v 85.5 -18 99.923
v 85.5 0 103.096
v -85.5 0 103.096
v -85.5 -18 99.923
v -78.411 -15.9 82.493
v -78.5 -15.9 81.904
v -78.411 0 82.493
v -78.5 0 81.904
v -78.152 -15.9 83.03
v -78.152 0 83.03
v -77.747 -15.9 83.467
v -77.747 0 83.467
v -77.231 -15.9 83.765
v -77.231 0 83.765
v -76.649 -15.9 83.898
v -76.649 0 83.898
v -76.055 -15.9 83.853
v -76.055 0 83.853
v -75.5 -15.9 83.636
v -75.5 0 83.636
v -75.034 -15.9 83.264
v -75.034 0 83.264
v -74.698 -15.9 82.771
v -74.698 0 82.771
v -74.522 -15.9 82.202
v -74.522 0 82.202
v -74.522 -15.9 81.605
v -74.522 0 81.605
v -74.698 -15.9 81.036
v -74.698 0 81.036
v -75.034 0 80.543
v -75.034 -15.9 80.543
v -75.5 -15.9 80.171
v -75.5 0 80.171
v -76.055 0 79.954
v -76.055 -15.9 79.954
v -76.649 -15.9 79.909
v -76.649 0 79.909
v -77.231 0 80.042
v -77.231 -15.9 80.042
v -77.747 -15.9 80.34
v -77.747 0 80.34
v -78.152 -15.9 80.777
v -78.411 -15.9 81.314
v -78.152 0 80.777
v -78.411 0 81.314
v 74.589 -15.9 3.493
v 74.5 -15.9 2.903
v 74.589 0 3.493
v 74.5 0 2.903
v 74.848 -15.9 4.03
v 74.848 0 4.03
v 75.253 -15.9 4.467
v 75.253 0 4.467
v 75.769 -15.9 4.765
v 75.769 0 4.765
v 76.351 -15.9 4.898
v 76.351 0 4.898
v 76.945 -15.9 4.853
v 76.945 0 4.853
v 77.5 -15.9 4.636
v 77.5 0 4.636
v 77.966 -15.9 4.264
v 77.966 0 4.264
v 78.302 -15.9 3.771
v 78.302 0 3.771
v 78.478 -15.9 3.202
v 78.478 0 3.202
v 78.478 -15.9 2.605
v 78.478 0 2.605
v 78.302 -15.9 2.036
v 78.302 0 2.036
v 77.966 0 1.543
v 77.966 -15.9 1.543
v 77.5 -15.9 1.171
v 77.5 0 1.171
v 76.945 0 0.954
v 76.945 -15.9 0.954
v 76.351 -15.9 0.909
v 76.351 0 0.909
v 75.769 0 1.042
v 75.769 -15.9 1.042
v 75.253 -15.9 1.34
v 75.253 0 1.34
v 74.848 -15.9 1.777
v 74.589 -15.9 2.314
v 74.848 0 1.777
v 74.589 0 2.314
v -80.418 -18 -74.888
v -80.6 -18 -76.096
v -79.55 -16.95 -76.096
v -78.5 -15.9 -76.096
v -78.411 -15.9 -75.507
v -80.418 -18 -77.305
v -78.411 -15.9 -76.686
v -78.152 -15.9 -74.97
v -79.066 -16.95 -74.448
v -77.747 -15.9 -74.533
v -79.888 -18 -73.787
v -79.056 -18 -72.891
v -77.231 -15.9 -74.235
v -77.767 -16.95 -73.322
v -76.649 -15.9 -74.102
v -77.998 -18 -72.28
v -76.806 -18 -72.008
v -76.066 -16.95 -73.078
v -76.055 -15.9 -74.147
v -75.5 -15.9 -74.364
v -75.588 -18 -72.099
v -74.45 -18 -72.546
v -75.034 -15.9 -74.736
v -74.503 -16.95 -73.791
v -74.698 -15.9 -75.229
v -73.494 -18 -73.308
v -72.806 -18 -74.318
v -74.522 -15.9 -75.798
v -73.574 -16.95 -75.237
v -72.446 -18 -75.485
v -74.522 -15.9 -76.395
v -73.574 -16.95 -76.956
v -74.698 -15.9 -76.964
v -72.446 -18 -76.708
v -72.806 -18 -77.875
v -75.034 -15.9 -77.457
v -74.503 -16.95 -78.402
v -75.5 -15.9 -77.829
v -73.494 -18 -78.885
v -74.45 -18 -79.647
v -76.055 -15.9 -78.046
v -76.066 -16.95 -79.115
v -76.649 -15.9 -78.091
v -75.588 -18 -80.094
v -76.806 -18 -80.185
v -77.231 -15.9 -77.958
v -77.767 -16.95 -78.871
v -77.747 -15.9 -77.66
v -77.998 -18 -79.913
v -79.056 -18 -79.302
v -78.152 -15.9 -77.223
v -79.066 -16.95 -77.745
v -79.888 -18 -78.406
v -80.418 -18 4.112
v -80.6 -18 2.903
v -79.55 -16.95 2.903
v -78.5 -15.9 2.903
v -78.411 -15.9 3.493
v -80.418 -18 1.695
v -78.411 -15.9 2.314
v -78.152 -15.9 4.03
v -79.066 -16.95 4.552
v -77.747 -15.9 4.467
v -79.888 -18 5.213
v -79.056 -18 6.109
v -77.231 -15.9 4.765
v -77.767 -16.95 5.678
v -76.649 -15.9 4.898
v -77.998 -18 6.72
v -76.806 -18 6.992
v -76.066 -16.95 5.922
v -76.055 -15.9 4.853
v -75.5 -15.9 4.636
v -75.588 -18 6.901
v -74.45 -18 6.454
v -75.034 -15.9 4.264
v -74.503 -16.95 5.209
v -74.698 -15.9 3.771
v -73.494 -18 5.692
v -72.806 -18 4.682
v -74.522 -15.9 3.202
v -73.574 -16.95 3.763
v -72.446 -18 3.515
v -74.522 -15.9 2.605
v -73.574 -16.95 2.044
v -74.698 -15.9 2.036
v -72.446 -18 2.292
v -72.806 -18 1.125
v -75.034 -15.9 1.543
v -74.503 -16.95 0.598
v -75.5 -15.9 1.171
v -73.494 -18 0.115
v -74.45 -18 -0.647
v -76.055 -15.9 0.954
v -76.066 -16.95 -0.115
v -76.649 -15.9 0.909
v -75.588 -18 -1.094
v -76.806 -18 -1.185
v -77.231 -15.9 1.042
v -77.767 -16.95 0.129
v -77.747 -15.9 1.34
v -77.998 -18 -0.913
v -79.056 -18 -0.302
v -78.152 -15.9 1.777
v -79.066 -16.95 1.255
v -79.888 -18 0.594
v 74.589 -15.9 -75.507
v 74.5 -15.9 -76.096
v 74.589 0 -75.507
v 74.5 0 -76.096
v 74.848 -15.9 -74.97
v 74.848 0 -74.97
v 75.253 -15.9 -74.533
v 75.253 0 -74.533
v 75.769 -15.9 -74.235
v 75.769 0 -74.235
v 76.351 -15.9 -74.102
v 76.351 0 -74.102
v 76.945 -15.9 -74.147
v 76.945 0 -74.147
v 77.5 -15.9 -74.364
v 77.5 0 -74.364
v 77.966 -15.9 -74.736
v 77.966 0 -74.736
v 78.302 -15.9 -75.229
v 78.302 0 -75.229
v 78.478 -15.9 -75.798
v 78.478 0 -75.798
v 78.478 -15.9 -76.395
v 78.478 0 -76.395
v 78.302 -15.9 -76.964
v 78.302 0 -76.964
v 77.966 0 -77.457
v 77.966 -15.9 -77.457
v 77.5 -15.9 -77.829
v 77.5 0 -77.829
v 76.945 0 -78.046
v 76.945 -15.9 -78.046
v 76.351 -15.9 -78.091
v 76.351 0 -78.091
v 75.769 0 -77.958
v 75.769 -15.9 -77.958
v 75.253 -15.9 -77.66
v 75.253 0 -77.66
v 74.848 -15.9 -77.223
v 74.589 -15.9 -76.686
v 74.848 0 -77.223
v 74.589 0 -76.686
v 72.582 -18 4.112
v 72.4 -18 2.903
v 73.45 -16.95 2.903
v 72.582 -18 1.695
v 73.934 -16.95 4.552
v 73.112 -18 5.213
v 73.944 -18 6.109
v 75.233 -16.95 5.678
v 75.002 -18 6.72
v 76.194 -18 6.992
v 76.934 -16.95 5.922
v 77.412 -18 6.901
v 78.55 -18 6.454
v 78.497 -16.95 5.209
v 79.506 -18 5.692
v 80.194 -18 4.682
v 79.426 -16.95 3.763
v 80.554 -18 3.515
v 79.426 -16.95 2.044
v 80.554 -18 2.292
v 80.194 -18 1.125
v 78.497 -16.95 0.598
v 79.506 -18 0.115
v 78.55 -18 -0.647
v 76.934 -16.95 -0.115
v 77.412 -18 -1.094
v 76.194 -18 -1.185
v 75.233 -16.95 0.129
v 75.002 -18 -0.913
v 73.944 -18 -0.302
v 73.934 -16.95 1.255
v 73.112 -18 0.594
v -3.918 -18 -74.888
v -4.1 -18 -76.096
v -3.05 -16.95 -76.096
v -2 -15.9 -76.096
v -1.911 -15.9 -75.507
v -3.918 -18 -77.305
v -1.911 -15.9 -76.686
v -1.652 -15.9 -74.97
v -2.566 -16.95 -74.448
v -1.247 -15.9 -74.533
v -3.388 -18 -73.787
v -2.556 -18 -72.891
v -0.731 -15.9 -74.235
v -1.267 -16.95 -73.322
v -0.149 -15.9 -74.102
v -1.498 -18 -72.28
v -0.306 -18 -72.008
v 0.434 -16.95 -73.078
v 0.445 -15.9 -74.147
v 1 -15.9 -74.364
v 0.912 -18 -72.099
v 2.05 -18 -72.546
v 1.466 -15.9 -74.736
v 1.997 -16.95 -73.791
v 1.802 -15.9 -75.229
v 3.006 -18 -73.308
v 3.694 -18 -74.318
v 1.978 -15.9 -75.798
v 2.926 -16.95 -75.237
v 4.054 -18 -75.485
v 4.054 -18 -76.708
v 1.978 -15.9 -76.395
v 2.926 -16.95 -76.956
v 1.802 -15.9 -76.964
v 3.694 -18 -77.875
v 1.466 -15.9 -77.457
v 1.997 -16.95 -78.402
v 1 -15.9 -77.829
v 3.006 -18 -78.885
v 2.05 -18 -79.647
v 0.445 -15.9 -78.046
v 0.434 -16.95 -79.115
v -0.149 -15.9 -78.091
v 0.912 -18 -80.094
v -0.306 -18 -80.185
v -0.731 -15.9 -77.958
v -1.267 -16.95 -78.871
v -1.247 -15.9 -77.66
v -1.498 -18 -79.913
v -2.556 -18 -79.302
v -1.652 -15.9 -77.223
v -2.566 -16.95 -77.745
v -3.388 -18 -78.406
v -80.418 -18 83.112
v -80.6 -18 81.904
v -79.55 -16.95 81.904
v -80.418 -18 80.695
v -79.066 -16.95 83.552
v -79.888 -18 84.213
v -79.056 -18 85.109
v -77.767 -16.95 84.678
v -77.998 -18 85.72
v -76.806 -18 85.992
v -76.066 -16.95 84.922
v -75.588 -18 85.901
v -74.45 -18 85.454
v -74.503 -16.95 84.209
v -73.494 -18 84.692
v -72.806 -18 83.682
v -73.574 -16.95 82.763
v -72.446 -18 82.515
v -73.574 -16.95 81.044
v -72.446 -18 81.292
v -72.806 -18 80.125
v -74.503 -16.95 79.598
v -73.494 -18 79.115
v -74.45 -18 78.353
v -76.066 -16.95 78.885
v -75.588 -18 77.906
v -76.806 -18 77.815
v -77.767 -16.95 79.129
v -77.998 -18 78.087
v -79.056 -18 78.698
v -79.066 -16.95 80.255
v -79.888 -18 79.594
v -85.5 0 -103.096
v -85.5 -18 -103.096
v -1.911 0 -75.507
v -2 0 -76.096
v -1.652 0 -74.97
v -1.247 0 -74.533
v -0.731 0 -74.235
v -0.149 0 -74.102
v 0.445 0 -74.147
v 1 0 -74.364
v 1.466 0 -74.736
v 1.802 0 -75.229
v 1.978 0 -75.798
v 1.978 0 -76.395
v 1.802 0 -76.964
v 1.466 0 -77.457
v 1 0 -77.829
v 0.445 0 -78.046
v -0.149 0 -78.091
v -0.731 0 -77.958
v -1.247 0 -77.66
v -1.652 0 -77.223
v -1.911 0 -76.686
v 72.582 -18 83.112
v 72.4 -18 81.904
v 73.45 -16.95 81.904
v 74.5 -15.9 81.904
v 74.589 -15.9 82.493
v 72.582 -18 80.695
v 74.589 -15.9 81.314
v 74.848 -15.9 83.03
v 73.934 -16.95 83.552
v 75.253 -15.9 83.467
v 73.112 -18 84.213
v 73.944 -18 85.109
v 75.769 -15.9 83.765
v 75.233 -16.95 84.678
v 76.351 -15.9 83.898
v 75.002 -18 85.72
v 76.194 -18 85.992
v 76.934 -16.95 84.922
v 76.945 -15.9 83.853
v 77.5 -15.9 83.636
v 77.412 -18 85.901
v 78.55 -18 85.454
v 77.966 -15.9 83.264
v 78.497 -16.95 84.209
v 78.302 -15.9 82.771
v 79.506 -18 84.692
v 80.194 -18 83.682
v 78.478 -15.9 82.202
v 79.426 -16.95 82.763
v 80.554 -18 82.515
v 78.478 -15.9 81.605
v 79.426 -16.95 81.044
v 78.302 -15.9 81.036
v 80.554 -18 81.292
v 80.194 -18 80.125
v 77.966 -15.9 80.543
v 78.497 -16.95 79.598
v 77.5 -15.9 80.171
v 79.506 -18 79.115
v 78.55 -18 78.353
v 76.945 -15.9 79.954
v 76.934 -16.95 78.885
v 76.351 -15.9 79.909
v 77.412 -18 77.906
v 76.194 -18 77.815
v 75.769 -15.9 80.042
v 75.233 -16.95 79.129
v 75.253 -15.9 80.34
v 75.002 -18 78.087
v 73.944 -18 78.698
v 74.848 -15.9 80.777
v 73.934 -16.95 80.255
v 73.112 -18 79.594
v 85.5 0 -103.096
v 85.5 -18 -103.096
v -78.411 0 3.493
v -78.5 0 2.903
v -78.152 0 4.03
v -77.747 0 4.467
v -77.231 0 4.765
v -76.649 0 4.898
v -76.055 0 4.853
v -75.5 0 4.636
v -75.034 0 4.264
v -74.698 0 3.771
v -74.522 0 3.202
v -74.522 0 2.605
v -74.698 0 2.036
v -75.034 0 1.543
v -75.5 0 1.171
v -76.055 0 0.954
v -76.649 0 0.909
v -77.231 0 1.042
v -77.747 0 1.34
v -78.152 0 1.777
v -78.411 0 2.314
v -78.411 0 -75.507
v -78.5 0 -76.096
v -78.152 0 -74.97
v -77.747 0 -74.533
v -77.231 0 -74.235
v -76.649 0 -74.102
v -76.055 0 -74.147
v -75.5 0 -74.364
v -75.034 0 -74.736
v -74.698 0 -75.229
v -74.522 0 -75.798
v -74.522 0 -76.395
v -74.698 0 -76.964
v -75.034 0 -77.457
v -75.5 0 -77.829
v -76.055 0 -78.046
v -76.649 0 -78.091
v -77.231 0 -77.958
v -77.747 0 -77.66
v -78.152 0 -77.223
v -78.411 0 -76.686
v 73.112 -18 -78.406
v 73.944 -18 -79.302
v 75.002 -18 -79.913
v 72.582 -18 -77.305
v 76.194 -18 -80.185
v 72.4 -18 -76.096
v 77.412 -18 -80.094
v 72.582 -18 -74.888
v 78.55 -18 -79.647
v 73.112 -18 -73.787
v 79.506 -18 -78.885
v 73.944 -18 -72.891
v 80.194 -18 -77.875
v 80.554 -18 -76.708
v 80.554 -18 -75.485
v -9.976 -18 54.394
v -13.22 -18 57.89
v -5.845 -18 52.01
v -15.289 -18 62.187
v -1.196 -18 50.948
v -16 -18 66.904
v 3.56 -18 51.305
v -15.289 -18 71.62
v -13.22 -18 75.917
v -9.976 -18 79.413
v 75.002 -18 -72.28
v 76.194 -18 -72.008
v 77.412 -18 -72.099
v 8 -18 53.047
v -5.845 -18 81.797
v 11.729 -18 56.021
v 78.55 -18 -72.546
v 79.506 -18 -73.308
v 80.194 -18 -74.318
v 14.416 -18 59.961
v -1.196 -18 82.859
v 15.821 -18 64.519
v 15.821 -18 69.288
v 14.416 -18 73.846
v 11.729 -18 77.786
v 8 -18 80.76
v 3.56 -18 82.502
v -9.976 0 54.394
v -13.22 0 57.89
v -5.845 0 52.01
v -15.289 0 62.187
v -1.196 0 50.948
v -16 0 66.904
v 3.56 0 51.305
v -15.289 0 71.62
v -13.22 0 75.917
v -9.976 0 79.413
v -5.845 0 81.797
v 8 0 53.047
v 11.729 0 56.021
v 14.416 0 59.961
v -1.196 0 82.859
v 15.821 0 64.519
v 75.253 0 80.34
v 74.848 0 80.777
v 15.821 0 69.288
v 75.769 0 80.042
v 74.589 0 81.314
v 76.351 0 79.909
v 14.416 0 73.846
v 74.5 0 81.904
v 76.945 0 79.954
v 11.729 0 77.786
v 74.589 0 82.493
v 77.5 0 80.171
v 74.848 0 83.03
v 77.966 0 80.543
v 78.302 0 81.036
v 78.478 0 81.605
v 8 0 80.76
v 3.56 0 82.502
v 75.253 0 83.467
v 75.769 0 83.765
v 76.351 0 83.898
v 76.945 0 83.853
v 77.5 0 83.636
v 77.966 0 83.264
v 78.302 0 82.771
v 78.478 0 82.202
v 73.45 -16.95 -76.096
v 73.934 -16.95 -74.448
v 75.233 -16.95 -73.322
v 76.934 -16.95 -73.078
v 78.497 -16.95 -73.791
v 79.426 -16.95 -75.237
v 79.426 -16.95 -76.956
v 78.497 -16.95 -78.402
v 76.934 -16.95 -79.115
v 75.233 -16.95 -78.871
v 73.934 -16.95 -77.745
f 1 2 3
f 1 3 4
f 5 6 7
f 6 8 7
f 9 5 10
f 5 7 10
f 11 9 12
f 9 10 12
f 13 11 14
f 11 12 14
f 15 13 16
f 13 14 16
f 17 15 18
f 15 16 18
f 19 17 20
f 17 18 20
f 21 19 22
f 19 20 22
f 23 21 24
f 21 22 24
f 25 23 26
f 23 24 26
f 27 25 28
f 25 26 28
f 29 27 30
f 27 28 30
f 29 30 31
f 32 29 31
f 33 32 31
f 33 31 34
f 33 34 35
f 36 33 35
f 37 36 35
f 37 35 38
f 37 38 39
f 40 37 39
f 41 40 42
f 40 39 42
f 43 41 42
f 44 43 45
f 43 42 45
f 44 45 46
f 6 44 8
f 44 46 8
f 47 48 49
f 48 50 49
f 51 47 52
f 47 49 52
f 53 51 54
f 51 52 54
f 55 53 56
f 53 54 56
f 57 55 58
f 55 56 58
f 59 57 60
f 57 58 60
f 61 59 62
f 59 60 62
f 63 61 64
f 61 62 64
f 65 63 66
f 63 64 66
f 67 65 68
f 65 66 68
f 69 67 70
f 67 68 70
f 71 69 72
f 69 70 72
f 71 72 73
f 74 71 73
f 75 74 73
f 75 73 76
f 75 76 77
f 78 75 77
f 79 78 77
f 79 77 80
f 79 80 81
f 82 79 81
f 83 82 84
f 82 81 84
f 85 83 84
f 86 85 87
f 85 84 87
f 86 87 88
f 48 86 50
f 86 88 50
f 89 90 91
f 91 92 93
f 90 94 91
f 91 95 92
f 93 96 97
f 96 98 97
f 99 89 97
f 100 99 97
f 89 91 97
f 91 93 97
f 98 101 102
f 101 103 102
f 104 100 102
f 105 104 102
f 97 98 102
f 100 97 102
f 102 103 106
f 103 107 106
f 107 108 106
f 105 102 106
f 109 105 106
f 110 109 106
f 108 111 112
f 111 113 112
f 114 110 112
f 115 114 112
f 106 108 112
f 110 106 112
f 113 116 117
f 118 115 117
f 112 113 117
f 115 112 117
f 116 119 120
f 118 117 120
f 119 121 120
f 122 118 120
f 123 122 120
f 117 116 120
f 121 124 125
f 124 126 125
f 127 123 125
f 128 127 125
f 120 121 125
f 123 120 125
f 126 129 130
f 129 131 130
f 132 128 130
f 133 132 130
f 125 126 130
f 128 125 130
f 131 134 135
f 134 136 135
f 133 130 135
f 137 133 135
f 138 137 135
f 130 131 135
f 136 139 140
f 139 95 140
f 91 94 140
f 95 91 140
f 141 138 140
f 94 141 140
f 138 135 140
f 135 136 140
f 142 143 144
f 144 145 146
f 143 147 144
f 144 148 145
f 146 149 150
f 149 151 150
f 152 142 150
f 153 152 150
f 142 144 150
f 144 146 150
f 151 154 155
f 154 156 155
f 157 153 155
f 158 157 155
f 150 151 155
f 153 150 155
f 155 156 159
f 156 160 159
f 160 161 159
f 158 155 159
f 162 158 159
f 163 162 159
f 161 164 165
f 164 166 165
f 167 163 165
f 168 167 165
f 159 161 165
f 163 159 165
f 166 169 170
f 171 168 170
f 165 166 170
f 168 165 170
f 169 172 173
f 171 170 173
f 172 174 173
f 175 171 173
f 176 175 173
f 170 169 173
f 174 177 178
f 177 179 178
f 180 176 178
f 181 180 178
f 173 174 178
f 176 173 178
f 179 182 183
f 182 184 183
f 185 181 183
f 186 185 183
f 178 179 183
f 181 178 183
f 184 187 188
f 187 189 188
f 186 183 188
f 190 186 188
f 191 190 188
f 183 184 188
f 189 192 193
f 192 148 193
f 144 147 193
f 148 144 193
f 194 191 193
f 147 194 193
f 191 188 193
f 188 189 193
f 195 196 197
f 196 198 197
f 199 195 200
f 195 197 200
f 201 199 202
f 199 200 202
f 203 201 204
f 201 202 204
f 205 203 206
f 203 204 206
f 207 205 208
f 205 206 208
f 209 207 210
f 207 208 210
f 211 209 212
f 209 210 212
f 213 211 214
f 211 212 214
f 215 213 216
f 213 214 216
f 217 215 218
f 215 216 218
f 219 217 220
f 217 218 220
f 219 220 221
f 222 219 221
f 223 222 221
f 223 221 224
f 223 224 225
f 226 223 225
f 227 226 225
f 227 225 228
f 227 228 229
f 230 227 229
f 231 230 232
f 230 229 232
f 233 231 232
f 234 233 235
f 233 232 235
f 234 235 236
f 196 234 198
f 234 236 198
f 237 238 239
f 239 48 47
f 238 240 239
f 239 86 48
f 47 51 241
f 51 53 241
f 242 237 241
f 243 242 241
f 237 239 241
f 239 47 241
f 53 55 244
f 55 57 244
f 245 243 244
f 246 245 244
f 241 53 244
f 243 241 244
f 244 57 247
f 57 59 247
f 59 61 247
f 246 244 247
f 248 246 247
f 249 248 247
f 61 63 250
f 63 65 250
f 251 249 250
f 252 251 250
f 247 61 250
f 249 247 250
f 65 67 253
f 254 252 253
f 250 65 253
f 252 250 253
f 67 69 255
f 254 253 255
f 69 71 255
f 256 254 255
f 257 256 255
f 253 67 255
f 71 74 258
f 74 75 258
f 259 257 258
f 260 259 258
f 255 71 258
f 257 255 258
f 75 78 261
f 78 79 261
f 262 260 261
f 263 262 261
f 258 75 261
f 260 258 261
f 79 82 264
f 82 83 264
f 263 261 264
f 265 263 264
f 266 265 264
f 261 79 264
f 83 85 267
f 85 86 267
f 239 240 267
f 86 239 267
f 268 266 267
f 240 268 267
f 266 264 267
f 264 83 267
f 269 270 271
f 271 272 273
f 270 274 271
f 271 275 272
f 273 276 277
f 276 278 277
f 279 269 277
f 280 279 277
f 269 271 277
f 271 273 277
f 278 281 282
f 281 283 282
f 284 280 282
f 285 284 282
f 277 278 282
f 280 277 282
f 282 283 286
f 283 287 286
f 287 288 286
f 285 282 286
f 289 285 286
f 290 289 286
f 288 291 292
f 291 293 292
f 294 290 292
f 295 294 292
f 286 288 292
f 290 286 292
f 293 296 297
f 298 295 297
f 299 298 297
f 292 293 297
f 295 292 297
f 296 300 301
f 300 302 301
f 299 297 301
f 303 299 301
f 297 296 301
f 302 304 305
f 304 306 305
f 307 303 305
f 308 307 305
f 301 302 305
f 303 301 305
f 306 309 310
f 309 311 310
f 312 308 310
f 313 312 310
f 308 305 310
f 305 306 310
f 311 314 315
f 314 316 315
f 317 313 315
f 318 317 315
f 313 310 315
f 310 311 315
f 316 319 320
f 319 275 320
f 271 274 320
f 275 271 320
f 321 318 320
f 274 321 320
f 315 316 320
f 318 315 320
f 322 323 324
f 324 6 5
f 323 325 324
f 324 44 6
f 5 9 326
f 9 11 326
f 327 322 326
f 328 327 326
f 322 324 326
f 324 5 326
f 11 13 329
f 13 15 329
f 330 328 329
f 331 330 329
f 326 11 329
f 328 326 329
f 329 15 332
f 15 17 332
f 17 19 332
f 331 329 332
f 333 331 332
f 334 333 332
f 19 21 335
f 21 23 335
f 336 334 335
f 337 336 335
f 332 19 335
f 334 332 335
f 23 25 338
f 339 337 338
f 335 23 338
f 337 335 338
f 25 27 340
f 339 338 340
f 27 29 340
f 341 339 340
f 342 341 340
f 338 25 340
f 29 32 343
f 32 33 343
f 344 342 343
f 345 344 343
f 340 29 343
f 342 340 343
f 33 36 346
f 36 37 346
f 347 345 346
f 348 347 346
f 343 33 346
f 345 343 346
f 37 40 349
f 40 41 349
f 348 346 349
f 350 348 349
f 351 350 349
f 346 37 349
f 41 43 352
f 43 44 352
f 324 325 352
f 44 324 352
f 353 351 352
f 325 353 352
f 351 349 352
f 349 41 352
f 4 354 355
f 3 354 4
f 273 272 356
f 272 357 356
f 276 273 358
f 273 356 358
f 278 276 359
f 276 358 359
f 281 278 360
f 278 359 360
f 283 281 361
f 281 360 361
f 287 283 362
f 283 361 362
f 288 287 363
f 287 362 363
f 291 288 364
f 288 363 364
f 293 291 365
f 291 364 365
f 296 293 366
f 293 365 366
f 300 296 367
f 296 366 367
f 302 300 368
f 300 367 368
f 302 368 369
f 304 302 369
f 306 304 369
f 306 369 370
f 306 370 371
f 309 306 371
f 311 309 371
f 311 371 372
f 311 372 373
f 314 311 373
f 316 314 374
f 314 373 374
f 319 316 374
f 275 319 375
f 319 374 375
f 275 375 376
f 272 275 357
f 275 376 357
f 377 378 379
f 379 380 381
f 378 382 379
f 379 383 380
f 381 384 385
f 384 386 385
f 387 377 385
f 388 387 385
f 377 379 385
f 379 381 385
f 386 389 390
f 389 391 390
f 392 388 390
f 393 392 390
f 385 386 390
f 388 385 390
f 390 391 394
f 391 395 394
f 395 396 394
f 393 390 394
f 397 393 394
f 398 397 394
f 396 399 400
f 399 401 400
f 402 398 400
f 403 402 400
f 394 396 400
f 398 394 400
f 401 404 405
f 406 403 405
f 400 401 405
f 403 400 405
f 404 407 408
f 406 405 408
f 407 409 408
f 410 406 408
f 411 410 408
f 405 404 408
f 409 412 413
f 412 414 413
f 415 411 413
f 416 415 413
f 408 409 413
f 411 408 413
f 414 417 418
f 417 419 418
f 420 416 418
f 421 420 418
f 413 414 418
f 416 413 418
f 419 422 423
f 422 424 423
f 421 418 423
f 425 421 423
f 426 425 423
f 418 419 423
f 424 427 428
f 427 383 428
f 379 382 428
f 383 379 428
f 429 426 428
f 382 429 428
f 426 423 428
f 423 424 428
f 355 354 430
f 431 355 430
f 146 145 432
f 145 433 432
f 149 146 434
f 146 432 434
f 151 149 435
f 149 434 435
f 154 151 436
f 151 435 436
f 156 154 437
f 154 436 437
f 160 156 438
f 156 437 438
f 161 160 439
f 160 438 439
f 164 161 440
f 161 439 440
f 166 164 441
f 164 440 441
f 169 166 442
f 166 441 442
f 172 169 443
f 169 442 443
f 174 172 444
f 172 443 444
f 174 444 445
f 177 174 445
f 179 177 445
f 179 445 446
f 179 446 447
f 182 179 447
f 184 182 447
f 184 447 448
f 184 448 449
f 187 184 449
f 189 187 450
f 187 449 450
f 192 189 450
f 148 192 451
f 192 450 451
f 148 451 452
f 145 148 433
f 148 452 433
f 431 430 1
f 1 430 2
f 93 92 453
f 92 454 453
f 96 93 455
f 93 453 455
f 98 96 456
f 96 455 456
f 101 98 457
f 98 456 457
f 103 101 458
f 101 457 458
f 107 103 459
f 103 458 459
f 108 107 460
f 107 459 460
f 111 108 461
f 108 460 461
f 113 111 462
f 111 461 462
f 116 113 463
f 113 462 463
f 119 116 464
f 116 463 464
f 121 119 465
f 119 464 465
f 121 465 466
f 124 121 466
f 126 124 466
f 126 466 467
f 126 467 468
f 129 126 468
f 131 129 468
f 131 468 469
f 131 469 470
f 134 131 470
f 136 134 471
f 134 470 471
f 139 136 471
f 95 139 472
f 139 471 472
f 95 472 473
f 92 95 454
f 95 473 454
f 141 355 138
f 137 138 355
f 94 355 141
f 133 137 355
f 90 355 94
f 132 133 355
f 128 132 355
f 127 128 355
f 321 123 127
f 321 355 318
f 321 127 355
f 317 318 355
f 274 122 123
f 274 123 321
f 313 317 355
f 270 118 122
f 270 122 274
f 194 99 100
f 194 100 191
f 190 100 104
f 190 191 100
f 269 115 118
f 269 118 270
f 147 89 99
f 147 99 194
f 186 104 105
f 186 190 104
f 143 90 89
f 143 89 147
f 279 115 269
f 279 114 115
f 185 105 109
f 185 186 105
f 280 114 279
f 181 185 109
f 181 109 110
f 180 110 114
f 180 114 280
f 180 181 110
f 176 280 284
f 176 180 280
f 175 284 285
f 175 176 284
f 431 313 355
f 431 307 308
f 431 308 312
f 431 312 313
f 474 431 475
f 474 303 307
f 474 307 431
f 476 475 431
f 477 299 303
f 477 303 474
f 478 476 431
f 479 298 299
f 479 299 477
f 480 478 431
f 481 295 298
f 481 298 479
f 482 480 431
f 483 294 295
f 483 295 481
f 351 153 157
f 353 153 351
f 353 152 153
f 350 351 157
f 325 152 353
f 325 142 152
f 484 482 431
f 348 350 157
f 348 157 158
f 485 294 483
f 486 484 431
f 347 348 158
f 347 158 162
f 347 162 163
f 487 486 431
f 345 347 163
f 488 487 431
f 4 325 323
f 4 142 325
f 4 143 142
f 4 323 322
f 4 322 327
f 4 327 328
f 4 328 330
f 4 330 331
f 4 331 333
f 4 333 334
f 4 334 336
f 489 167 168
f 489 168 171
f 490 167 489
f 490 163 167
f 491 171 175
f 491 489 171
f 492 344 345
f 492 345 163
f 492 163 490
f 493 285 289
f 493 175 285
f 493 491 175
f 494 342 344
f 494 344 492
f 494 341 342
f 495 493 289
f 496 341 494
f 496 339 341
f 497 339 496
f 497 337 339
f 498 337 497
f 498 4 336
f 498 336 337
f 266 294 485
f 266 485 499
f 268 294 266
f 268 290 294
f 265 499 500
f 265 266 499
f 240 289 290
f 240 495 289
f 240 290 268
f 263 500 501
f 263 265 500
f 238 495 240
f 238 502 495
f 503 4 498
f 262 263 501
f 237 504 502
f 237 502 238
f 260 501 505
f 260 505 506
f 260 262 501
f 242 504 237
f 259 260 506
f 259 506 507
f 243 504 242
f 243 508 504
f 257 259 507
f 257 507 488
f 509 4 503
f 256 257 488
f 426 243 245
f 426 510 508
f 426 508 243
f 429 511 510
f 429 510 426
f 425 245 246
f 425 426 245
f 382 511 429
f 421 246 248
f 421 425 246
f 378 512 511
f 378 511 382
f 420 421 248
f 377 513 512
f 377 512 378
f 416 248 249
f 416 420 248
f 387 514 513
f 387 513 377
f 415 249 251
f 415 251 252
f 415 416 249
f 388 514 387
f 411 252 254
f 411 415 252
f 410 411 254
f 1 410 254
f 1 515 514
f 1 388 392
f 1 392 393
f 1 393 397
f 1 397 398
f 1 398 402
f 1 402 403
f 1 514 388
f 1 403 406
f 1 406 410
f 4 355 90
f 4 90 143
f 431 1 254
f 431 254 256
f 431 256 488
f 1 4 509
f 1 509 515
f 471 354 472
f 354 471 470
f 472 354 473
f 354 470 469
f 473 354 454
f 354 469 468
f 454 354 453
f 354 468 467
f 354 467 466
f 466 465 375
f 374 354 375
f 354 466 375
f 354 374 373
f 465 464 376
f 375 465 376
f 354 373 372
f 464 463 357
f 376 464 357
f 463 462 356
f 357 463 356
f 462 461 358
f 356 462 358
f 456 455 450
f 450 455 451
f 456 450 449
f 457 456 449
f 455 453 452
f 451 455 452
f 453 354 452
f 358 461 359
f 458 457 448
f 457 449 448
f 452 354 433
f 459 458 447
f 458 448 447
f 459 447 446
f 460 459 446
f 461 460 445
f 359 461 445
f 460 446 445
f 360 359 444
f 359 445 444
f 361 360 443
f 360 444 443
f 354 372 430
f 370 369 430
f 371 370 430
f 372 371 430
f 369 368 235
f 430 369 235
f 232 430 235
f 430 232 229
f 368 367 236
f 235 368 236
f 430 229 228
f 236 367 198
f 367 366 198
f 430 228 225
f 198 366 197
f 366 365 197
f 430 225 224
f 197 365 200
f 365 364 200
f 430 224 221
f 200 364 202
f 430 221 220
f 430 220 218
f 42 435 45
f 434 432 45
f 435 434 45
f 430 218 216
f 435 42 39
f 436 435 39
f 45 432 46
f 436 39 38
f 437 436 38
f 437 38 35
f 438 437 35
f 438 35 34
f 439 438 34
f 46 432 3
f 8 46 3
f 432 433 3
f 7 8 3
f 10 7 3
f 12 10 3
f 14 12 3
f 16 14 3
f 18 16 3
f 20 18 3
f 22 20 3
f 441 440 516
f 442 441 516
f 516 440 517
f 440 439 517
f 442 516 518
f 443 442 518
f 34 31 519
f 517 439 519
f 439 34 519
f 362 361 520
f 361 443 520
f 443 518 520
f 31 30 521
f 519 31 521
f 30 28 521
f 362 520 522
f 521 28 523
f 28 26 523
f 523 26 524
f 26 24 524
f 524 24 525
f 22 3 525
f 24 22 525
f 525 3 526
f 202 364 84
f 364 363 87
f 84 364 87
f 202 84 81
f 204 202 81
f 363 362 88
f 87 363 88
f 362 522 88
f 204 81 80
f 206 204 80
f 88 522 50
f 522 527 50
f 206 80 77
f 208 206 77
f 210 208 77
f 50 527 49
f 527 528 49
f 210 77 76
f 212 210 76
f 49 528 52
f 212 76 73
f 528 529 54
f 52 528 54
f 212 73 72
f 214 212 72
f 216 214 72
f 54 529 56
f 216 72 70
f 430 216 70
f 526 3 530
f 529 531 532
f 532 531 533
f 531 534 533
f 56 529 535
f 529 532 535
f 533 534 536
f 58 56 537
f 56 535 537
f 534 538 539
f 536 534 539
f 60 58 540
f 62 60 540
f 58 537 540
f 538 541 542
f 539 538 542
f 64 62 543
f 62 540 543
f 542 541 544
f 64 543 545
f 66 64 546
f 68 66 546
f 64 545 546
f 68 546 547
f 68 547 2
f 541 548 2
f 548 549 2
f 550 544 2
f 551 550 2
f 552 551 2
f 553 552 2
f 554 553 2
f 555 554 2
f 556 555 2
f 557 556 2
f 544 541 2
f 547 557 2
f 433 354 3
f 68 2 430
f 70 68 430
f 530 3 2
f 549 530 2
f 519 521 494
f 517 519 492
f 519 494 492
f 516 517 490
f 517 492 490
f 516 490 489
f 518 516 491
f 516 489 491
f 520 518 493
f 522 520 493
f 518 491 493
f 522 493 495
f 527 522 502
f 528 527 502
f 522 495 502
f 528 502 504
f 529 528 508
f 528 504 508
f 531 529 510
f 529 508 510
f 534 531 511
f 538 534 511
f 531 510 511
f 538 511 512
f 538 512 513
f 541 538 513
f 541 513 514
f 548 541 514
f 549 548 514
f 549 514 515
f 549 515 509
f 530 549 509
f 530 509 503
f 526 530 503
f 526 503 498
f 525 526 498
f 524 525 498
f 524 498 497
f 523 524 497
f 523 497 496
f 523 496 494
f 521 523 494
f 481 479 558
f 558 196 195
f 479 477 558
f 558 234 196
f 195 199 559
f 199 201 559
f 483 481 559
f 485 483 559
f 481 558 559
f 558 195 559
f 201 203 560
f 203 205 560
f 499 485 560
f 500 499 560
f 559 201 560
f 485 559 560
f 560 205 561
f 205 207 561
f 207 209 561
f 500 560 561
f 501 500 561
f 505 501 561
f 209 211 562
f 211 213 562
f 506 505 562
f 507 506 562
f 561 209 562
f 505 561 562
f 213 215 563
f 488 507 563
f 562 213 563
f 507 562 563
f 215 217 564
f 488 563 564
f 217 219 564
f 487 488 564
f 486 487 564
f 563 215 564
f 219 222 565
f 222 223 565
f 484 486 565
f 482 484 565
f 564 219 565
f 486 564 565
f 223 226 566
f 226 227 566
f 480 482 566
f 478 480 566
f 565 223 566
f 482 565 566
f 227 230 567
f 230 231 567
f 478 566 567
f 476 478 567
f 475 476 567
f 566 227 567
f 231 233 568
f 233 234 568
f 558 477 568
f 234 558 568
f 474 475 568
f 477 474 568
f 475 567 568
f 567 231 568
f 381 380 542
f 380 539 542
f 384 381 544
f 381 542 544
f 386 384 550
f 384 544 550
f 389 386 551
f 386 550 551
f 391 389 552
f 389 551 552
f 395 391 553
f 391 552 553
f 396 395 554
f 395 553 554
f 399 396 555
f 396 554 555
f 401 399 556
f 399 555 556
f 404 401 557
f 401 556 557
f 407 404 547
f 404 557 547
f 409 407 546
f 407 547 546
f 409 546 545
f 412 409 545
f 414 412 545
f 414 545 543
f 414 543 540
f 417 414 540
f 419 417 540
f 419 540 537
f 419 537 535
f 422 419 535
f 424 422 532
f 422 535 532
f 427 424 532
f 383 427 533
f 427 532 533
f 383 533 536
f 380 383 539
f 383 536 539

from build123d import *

# Parameters (mm, degrees)
F0_W           = 171
F0_H           = 206.193
F1_DEPTH       = 18
F2_D           = 32
F4_DEPTH       = 171.001
F6_D           = 4
F6_CSINK_D     = 8.2
F6_CSINK_ANGLE = 90
F7_D           = 4
F7_CSINK_D     = 8.2
F7_CSINK_ANGLE = 90
F8_D           = 4
F8_CSINK_D     = 8.2
F8_CSINK_ANGLE = 90
F9_D           = 4
F9_CSINK_D     = 8.2
F9_CSINK_ANGLE = 90


with BuildPart() as f1:
    # F0 (on Front) → F1 (new body)
    with BuildSketch(Plane.XZ):
        Rectangle(F0_W, F0_H)
    extrude(amount=F1_DEPTH)

    # F2 (through all)
    with Locations(Plane(origin=(0, 0, 0), x_dir=(1, 0, 0), z_dir=(0, 1, 0))):
        with Locations((0, -66.9035)):
            Hole(F2_D / 2)

    # F3 (on face) → F4 (cut, through all)
    with BuildSketch(Plane(origin=(-85.5, 0, 0), x_dir=(0, -1, 0), z_dir=(-1, 0, 0))):
        Polygon((18, 103.0965), (0, 103.0965), (18, 99.9226143472), align=None)
    extrude(amount=-F4_DEPTH, mode=Mode.SUBTRACT)

    # F6 (through all)
    with Locations(Plane.XZ.offset(18)):
        with Locations((0, -76.0965)):
            CounterSinkHole(F6_D / 2, F6_CSINK_D / 2, counter_sink_angle=F6_CSINK_ANGLE)

    # F7 (through all)
    with Locations(Plane.XZ.offset(18)):
        with Locations((-76.5, -76.0965), (76.5, -76.0965)):
            CounterSinkHole(F7_D / 2, F7_CSINK_D / 2, counter_sink_angle=F7_CSINK_ANGLE)

    # F8 (through all)
    with Locations(Plane.XZ.offset(18)):
        with Locations((-76.5, 81.9035), (76.5, 81.9035)):
            CounterSinkHole(F8_D / 2, F8_CSINK_D / 2, counter_sink_angle=F8_CSINK_ANGLE)

    # F9 (through all)
    with Locations(Plane.XZ.offset(18)):
        with Locations((-76.5, 2.9035), (76.5, 2.9035)):
            CounterSinkHole(F9_D / 2, F9_CSINK_D / 2, counter_sink_angle=F9_CSINK_ANGLE)


solid = f1.part
